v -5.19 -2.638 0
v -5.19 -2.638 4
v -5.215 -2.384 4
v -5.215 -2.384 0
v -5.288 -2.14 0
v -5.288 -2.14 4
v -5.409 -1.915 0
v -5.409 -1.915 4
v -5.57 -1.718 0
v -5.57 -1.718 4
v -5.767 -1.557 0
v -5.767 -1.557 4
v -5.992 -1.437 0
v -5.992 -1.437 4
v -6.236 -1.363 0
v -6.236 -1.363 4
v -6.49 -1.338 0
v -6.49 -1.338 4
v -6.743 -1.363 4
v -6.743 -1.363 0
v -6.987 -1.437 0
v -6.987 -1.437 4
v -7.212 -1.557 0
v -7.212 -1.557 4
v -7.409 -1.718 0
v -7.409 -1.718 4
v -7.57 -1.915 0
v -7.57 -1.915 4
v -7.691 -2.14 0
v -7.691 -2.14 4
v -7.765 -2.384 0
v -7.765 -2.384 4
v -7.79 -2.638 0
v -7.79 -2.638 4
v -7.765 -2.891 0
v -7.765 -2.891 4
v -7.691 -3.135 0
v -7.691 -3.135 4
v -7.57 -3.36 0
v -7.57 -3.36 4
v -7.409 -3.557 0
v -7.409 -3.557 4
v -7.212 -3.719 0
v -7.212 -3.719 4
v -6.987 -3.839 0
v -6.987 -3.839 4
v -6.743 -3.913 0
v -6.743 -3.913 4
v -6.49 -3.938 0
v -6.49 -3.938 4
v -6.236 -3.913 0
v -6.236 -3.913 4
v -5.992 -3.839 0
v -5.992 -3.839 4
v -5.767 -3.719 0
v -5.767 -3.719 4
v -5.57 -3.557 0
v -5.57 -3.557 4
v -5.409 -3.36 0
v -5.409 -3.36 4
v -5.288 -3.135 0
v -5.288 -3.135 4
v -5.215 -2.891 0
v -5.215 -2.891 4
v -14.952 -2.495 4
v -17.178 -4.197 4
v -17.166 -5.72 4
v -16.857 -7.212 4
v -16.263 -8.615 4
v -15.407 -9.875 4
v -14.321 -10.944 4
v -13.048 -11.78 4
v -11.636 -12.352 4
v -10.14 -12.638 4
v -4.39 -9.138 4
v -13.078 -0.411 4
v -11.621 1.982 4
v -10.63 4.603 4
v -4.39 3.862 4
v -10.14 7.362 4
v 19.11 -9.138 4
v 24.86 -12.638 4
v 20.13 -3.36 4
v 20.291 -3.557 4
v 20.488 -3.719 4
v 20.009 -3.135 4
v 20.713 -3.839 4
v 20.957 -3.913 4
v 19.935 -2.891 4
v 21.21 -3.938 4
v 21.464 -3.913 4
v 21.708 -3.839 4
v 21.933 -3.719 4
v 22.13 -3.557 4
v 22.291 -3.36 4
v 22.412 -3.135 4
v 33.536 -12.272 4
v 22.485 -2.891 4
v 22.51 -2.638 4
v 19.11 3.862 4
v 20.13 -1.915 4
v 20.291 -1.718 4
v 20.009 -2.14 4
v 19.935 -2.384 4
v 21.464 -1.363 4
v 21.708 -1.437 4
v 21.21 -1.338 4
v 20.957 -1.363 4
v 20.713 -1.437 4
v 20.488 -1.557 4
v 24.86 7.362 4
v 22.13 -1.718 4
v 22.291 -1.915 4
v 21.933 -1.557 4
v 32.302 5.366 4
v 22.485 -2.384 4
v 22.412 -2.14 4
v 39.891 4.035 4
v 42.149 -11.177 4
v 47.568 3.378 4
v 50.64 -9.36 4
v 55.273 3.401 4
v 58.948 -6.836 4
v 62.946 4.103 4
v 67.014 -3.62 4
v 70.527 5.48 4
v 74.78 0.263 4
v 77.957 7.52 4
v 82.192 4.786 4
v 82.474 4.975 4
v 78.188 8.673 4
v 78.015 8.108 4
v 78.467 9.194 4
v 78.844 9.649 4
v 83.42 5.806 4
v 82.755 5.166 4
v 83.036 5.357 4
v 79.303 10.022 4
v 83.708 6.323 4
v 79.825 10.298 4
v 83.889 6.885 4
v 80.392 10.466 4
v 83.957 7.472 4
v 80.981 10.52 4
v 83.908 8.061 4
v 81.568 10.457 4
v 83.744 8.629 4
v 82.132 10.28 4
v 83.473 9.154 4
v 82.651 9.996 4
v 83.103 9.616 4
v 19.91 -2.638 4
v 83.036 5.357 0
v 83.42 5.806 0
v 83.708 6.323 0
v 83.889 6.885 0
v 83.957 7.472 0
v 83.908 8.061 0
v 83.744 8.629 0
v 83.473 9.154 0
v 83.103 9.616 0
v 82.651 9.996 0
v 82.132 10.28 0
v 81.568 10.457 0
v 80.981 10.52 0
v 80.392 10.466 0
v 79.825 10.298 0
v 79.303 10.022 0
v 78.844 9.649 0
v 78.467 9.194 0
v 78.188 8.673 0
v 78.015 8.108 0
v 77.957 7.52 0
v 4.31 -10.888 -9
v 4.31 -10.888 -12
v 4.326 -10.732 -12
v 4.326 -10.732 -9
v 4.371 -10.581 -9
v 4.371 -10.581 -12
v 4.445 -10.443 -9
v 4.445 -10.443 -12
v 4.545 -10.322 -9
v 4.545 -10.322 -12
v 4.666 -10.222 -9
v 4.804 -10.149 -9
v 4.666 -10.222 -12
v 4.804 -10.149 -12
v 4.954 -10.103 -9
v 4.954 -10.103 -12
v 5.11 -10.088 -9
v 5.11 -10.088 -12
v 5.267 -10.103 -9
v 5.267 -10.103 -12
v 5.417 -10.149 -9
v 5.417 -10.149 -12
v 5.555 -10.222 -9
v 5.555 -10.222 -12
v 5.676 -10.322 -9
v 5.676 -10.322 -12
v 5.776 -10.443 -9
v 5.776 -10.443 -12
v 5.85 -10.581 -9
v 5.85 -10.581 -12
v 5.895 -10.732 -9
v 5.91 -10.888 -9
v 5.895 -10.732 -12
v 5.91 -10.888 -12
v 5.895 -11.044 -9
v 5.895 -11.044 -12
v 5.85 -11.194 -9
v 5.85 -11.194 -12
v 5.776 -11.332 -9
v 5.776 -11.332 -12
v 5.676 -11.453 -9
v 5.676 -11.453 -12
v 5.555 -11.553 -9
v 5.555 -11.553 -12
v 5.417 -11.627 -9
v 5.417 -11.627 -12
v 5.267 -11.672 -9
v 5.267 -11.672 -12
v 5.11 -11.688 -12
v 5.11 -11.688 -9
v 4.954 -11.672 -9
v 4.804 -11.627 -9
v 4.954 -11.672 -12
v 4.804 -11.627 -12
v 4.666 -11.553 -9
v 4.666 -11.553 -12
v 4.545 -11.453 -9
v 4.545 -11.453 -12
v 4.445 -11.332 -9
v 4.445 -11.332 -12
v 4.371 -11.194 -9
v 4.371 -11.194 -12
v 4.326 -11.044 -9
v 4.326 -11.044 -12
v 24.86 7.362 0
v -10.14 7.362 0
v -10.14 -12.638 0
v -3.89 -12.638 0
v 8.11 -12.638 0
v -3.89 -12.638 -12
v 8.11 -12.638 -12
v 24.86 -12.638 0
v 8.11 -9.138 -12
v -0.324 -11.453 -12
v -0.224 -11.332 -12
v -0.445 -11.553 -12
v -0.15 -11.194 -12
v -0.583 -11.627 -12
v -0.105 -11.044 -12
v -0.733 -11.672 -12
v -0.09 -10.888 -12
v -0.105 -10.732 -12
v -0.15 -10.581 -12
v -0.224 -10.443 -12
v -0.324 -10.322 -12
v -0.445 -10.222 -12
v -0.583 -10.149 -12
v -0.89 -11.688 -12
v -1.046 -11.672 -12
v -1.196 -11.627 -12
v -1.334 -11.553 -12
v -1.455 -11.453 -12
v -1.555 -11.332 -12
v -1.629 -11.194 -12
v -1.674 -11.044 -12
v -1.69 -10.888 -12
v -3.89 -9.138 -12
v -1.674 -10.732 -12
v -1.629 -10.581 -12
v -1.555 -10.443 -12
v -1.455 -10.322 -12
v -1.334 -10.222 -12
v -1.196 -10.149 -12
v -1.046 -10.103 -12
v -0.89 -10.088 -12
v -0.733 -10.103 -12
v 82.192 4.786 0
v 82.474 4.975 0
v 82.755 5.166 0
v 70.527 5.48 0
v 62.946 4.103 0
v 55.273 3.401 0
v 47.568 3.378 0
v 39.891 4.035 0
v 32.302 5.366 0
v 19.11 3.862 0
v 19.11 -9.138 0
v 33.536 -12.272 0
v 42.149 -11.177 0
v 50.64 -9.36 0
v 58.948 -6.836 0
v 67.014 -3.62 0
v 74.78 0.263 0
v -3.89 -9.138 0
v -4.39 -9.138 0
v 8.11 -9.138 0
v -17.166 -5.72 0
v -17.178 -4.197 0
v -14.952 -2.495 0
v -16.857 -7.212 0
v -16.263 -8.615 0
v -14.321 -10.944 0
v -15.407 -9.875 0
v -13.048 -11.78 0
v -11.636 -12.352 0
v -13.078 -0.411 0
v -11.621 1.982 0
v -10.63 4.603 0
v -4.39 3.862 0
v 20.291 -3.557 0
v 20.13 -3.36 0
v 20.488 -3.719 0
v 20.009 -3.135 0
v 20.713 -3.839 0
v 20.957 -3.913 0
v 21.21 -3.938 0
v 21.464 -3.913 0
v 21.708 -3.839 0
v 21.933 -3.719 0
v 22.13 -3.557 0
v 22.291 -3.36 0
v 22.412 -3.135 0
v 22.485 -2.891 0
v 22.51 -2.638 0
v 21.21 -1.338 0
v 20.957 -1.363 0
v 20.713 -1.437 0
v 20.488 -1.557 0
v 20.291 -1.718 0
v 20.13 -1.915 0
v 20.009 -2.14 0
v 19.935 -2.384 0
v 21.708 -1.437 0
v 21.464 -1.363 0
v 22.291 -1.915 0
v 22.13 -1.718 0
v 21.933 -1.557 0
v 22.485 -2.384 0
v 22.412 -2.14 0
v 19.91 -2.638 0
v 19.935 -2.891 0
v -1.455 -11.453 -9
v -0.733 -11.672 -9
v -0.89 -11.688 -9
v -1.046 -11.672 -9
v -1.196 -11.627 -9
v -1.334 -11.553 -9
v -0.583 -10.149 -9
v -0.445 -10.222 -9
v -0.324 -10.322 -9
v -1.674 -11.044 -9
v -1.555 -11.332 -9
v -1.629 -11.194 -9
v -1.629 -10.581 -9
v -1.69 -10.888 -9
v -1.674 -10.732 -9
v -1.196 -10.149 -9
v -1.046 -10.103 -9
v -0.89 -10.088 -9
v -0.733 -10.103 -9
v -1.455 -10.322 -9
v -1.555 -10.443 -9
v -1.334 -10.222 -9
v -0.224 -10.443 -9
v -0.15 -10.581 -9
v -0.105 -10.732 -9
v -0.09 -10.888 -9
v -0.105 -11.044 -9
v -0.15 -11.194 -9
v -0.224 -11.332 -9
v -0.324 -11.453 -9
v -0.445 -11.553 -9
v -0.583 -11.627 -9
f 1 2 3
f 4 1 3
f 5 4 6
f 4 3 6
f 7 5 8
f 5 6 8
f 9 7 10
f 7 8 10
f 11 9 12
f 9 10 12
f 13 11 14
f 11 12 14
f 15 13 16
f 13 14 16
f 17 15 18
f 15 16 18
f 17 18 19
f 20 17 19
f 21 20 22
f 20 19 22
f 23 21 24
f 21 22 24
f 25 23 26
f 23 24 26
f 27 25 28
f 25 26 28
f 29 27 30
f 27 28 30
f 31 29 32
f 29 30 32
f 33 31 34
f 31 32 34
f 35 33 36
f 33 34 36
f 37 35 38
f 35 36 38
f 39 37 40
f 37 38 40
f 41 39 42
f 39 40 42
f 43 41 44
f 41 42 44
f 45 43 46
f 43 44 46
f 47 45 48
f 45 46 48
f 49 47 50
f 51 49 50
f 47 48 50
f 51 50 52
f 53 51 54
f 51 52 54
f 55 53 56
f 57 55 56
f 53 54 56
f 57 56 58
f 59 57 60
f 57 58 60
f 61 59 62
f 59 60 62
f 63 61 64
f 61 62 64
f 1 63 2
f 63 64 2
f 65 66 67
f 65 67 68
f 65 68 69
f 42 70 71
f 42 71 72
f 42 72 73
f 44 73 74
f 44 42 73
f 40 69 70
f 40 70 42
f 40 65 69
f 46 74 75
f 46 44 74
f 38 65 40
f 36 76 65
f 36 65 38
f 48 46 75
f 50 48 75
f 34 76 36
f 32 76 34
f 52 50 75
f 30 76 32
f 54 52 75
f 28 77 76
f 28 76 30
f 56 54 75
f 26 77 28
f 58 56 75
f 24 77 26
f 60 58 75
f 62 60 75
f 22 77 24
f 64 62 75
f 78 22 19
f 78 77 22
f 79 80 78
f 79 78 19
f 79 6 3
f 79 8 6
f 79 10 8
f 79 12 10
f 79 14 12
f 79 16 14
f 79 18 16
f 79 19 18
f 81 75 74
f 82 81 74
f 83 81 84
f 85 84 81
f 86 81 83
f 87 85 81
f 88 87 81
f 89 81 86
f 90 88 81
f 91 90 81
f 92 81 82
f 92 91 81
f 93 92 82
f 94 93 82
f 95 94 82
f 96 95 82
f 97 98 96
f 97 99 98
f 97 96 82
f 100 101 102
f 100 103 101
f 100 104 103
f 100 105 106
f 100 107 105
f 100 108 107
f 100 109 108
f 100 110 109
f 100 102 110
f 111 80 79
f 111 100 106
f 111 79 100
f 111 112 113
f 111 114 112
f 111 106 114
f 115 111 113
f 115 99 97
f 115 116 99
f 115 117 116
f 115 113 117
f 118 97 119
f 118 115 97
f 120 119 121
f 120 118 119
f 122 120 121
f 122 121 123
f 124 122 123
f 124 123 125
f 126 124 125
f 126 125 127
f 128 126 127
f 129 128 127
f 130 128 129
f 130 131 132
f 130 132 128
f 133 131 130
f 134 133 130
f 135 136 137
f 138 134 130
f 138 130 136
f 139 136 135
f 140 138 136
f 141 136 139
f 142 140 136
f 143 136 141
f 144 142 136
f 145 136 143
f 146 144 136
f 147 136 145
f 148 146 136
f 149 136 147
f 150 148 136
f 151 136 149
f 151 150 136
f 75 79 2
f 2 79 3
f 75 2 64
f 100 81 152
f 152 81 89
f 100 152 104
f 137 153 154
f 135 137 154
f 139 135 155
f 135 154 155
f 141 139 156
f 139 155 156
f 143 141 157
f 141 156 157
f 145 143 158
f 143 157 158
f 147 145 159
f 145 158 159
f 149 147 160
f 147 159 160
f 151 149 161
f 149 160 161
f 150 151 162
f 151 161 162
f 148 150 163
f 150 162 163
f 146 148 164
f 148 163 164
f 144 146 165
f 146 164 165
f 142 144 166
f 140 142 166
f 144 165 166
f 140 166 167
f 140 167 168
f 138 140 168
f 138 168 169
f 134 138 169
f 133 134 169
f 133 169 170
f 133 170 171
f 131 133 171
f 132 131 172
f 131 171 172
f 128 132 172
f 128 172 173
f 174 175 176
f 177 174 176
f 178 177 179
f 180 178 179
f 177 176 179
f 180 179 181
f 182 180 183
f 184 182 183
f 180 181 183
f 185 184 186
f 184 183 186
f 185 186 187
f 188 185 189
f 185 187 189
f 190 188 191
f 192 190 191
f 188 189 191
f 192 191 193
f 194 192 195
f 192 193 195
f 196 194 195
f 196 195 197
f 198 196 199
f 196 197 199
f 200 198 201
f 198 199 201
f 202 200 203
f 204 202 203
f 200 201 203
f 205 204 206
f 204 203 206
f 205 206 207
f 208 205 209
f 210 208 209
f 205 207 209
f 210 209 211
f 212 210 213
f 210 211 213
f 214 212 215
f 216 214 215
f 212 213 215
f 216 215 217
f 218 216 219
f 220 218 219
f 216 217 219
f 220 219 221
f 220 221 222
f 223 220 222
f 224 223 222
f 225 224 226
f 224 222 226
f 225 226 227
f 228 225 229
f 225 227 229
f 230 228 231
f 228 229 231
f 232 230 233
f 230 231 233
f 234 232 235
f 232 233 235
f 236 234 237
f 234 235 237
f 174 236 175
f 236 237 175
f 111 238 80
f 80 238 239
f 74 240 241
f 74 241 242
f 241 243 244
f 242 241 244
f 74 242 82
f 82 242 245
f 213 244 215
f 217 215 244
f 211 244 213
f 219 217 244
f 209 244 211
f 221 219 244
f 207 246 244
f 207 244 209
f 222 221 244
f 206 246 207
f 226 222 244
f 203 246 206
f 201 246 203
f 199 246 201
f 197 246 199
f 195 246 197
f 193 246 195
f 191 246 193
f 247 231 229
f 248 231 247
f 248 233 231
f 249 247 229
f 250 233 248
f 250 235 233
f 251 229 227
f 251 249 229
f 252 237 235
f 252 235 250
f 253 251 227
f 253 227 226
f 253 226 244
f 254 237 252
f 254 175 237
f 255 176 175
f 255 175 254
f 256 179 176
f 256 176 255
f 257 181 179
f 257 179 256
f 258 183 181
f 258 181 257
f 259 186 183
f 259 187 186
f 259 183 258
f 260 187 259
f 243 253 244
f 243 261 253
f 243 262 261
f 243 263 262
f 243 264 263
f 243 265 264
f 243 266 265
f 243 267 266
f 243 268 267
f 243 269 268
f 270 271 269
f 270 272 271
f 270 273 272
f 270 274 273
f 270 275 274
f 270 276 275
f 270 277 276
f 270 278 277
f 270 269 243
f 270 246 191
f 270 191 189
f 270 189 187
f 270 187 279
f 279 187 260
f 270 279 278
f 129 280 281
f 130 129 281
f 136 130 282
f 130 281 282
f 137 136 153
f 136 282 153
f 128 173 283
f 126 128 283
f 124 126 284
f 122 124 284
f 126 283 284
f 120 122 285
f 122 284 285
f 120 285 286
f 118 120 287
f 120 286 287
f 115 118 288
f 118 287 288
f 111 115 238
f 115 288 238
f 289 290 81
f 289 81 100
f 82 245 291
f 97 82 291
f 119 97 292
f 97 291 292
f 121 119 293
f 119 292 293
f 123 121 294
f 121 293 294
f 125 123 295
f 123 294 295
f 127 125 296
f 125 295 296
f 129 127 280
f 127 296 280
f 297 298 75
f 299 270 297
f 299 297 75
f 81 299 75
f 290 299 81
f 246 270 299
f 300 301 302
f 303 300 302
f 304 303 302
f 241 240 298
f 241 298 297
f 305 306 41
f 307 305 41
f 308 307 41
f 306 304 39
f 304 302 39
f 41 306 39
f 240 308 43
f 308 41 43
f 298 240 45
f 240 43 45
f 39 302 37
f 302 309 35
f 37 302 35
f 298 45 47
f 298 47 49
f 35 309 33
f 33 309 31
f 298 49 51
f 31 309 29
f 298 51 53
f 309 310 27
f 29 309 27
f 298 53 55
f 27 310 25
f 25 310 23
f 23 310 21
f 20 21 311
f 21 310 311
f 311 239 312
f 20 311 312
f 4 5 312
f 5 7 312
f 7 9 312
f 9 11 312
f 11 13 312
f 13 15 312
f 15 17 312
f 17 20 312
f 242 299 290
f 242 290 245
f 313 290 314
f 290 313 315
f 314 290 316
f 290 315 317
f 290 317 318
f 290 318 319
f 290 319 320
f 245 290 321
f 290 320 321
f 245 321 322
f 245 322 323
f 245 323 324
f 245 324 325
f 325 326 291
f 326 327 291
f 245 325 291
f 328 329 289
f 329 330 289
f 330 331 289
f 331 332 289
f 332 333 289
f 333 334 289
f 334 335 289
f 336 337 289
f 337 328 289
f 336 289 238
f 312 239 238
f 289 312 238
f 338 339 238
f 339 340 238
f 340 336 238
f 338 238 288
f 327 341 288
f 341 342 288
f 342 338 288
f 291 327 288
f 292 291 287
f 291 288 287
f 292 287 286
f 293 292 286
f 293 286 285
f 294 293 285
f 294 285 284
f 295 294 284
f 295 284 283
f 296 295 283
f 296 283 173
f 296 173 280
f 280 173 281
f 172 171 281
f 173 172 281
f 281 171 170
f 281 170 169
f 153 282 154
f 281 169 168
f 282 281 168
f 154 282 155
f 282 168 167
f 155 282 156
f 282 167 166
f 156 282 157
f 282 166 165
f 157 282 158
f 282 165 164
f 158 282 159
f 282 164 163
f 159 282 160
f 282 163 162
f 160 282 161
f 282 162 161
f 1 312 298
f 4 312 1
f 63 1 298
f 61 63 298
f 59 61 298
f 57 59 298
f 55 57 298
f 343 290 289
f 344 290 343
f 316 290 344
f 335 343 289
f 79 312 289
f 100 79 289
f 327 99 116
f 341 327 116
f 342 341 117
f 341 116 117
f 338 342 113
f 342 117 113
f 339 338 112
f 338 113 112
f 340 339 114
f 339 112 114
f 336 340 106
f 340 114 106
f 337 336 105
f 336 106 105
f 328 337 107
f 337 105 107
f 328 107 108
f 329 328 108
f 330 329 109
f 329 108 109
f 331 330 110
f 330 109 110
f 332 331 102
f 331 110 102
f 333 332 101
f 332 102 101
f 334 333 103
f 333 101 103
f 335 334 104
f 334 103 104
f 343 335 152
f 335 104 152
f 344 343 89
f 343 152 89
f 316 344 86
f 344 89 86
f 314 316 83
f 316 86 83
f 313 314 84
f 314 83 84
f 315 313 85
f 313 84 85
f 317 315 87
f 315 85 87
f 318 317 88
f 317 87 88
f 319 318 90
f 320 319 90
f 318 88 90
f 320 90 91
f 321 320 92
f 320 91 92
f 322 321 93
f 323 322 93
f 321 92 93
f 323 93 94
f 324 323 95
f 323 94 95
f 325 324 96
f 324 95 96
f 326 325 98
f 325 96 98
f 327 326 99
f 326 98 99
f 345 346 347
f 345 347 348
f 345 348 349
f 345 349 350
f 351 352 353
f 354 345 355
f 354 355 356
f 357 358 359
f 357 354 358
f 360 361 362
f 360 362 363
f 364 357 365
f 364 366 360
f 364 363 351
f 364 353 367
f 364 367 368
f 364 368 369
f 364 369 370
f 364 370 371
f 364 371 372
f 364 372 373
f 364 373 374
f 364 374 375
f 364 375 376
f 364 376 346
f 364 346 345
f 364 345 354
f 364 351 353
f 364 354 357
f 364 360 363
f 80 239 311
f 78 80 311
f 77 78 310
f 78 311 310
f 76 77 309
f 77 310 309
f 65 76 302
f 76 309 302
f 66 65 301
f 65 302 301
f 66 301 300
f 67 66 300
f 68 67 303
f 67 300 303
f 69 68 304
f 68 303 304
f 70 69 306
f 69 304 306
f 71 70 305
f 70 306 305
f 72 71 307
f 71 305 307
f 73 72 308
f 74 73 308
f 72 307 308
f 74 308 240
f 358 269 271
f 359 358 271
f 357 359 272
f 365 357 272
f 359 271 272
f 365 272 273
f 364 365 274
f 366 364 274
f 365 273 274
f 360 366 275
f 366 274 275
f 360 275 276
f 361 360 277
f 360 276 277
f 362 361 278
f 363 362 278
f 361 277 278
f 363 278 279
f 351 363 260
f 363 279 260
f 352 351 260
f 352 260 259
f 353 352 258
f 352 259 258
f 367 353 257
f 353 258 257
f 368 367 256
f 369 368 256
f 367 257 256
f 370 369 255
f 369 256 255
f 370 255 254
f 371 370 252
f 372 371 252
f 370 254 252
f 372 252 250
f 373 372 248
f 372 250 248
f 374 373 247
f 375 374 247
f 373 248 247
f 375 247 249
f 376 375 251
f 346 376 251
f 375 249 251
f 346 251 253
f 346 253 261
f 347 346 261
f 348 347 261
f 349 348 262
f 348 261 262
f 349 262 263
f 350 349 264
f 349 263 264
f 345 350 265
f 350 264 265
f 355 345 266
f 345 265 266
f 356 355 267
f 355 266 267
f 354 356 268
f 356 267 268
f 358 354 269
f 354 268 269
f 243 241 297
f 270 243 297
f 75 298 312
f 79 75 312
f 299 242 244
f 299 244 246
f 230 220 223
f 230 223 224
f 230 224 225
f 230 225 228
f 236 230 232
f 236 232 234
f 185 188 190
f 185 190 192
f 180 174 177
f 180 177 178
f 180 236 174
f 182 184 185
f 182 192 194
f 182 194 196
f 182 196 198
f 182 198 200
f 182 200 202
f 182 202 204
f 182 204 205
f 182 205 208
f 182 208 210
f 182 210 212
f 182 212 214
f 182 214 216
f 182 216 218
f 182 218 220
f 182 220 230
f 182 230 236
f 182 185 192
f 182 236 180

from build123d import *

# Parameters (mm, degrees)
SKETCH1_W           = 23.5
SKETCH1_H           = 13
BOSS_EXTRUDE1_DEPTH = 4
SKETCH4_W           = 12
SKETCH4_H           = 3.5
BOSS_EXTRUDE3_DEPTH = 12
SKETCH5_R           = 0.8
CUT_EXTRUDE2_DEPTH  = 3
SKETCH6_R           = 1.3
CUT_EXTRUDE3_DEPTH  = 4


with BuildPart() as part:
    # Sketch1 → Boss-Extrude1 (new body)
    with BuildSketch(Plane.XY):
        with BuildLine():
            Line((24.860467777, 7.362362669), (-10.139532223, 7.362362669))
            ThreePointArc((-10.139532223, 7.362362669), (-12.294111981, 0.751764817), (-17.178188495, -4.196771785))
            ThreePointArc((-17.178188495, -4.196771785), (-15.407020853, -9.874958003), (-10.139532223, -12.637637331))
            Line((-10.139532223, -12.637637331), (24.860467777, -12.637637331))
            ThreePointArc((24.860467777, -12.637637331), (54.82087059, -8.185603487), (82.192202879, 4.785769252))
            ThreePointArc((82.192202879, 4.785769252), (82.614789286, 5.070273598), (83.035963889, 5.356863806))
            ThreePointArc((83.035963889, 5.356863806), (82.132298227, 10.279823625), (77.956940726, 7.519654292))
            ThreePointArc((77.956940726, 7.519654292), (51.420959061, 3.304188228), (24.860467777, 7.362362669))
        make_face()
        with Locations((7.360467777, -2.637637331)):
            Rectangle(SKETCH1_W, SKETCH1_H, mode=Mode.SUBTRACT)
    extrude(amount=BOSS_EXTRUDE1_DEPTH)

    # Sketch4 → Boss-Extrude3 (add)
    with BuildSketch(Plane(origin=(0, 0, 0), x_dir=(-1, 0, 0), z_dir=(0, 0, -1))):
        with Locations((-2.110467777, -10.887637331)):
            Rectangle(SKETCH4_W, SKETCH4_H)
    extrude(amount=BOSS_EXTRUDE3_DEPTH)

    # Sketch5 → Cut-Extrude2 (cut)
    with BuildSketch(Plane(origin=(0, 0, -12), x_dir=(-1, 0, 0), z_dir=(0, 0, -1))):
        with Locations((0.889532223, -10.887637331)):
            Circle(SKETCH5_R)
        with Locations((-5.110467777, -10.887637331)):
            Circle(SKETCH5_R)
    extrude(amount=-CUT_EXTRUDE2_DEPTH, mode=Mode.SUBTRACT)

    # Sketch6 → Cut-Extrude3 (cut)
    with BuildSketch(Plane.XY.offset(4)):
        with Locations((21.210467777, -2.637637331)):
            Circle(SKETCH6_R)
        with Locations((-6.489532223, -2.637637331)):
            Circle(SKETCH6_R)
    extrude(amount=-CUT_EXTRUDE3_DEPTH, mode=Mode.SUBTRACT)


solid = part.part
